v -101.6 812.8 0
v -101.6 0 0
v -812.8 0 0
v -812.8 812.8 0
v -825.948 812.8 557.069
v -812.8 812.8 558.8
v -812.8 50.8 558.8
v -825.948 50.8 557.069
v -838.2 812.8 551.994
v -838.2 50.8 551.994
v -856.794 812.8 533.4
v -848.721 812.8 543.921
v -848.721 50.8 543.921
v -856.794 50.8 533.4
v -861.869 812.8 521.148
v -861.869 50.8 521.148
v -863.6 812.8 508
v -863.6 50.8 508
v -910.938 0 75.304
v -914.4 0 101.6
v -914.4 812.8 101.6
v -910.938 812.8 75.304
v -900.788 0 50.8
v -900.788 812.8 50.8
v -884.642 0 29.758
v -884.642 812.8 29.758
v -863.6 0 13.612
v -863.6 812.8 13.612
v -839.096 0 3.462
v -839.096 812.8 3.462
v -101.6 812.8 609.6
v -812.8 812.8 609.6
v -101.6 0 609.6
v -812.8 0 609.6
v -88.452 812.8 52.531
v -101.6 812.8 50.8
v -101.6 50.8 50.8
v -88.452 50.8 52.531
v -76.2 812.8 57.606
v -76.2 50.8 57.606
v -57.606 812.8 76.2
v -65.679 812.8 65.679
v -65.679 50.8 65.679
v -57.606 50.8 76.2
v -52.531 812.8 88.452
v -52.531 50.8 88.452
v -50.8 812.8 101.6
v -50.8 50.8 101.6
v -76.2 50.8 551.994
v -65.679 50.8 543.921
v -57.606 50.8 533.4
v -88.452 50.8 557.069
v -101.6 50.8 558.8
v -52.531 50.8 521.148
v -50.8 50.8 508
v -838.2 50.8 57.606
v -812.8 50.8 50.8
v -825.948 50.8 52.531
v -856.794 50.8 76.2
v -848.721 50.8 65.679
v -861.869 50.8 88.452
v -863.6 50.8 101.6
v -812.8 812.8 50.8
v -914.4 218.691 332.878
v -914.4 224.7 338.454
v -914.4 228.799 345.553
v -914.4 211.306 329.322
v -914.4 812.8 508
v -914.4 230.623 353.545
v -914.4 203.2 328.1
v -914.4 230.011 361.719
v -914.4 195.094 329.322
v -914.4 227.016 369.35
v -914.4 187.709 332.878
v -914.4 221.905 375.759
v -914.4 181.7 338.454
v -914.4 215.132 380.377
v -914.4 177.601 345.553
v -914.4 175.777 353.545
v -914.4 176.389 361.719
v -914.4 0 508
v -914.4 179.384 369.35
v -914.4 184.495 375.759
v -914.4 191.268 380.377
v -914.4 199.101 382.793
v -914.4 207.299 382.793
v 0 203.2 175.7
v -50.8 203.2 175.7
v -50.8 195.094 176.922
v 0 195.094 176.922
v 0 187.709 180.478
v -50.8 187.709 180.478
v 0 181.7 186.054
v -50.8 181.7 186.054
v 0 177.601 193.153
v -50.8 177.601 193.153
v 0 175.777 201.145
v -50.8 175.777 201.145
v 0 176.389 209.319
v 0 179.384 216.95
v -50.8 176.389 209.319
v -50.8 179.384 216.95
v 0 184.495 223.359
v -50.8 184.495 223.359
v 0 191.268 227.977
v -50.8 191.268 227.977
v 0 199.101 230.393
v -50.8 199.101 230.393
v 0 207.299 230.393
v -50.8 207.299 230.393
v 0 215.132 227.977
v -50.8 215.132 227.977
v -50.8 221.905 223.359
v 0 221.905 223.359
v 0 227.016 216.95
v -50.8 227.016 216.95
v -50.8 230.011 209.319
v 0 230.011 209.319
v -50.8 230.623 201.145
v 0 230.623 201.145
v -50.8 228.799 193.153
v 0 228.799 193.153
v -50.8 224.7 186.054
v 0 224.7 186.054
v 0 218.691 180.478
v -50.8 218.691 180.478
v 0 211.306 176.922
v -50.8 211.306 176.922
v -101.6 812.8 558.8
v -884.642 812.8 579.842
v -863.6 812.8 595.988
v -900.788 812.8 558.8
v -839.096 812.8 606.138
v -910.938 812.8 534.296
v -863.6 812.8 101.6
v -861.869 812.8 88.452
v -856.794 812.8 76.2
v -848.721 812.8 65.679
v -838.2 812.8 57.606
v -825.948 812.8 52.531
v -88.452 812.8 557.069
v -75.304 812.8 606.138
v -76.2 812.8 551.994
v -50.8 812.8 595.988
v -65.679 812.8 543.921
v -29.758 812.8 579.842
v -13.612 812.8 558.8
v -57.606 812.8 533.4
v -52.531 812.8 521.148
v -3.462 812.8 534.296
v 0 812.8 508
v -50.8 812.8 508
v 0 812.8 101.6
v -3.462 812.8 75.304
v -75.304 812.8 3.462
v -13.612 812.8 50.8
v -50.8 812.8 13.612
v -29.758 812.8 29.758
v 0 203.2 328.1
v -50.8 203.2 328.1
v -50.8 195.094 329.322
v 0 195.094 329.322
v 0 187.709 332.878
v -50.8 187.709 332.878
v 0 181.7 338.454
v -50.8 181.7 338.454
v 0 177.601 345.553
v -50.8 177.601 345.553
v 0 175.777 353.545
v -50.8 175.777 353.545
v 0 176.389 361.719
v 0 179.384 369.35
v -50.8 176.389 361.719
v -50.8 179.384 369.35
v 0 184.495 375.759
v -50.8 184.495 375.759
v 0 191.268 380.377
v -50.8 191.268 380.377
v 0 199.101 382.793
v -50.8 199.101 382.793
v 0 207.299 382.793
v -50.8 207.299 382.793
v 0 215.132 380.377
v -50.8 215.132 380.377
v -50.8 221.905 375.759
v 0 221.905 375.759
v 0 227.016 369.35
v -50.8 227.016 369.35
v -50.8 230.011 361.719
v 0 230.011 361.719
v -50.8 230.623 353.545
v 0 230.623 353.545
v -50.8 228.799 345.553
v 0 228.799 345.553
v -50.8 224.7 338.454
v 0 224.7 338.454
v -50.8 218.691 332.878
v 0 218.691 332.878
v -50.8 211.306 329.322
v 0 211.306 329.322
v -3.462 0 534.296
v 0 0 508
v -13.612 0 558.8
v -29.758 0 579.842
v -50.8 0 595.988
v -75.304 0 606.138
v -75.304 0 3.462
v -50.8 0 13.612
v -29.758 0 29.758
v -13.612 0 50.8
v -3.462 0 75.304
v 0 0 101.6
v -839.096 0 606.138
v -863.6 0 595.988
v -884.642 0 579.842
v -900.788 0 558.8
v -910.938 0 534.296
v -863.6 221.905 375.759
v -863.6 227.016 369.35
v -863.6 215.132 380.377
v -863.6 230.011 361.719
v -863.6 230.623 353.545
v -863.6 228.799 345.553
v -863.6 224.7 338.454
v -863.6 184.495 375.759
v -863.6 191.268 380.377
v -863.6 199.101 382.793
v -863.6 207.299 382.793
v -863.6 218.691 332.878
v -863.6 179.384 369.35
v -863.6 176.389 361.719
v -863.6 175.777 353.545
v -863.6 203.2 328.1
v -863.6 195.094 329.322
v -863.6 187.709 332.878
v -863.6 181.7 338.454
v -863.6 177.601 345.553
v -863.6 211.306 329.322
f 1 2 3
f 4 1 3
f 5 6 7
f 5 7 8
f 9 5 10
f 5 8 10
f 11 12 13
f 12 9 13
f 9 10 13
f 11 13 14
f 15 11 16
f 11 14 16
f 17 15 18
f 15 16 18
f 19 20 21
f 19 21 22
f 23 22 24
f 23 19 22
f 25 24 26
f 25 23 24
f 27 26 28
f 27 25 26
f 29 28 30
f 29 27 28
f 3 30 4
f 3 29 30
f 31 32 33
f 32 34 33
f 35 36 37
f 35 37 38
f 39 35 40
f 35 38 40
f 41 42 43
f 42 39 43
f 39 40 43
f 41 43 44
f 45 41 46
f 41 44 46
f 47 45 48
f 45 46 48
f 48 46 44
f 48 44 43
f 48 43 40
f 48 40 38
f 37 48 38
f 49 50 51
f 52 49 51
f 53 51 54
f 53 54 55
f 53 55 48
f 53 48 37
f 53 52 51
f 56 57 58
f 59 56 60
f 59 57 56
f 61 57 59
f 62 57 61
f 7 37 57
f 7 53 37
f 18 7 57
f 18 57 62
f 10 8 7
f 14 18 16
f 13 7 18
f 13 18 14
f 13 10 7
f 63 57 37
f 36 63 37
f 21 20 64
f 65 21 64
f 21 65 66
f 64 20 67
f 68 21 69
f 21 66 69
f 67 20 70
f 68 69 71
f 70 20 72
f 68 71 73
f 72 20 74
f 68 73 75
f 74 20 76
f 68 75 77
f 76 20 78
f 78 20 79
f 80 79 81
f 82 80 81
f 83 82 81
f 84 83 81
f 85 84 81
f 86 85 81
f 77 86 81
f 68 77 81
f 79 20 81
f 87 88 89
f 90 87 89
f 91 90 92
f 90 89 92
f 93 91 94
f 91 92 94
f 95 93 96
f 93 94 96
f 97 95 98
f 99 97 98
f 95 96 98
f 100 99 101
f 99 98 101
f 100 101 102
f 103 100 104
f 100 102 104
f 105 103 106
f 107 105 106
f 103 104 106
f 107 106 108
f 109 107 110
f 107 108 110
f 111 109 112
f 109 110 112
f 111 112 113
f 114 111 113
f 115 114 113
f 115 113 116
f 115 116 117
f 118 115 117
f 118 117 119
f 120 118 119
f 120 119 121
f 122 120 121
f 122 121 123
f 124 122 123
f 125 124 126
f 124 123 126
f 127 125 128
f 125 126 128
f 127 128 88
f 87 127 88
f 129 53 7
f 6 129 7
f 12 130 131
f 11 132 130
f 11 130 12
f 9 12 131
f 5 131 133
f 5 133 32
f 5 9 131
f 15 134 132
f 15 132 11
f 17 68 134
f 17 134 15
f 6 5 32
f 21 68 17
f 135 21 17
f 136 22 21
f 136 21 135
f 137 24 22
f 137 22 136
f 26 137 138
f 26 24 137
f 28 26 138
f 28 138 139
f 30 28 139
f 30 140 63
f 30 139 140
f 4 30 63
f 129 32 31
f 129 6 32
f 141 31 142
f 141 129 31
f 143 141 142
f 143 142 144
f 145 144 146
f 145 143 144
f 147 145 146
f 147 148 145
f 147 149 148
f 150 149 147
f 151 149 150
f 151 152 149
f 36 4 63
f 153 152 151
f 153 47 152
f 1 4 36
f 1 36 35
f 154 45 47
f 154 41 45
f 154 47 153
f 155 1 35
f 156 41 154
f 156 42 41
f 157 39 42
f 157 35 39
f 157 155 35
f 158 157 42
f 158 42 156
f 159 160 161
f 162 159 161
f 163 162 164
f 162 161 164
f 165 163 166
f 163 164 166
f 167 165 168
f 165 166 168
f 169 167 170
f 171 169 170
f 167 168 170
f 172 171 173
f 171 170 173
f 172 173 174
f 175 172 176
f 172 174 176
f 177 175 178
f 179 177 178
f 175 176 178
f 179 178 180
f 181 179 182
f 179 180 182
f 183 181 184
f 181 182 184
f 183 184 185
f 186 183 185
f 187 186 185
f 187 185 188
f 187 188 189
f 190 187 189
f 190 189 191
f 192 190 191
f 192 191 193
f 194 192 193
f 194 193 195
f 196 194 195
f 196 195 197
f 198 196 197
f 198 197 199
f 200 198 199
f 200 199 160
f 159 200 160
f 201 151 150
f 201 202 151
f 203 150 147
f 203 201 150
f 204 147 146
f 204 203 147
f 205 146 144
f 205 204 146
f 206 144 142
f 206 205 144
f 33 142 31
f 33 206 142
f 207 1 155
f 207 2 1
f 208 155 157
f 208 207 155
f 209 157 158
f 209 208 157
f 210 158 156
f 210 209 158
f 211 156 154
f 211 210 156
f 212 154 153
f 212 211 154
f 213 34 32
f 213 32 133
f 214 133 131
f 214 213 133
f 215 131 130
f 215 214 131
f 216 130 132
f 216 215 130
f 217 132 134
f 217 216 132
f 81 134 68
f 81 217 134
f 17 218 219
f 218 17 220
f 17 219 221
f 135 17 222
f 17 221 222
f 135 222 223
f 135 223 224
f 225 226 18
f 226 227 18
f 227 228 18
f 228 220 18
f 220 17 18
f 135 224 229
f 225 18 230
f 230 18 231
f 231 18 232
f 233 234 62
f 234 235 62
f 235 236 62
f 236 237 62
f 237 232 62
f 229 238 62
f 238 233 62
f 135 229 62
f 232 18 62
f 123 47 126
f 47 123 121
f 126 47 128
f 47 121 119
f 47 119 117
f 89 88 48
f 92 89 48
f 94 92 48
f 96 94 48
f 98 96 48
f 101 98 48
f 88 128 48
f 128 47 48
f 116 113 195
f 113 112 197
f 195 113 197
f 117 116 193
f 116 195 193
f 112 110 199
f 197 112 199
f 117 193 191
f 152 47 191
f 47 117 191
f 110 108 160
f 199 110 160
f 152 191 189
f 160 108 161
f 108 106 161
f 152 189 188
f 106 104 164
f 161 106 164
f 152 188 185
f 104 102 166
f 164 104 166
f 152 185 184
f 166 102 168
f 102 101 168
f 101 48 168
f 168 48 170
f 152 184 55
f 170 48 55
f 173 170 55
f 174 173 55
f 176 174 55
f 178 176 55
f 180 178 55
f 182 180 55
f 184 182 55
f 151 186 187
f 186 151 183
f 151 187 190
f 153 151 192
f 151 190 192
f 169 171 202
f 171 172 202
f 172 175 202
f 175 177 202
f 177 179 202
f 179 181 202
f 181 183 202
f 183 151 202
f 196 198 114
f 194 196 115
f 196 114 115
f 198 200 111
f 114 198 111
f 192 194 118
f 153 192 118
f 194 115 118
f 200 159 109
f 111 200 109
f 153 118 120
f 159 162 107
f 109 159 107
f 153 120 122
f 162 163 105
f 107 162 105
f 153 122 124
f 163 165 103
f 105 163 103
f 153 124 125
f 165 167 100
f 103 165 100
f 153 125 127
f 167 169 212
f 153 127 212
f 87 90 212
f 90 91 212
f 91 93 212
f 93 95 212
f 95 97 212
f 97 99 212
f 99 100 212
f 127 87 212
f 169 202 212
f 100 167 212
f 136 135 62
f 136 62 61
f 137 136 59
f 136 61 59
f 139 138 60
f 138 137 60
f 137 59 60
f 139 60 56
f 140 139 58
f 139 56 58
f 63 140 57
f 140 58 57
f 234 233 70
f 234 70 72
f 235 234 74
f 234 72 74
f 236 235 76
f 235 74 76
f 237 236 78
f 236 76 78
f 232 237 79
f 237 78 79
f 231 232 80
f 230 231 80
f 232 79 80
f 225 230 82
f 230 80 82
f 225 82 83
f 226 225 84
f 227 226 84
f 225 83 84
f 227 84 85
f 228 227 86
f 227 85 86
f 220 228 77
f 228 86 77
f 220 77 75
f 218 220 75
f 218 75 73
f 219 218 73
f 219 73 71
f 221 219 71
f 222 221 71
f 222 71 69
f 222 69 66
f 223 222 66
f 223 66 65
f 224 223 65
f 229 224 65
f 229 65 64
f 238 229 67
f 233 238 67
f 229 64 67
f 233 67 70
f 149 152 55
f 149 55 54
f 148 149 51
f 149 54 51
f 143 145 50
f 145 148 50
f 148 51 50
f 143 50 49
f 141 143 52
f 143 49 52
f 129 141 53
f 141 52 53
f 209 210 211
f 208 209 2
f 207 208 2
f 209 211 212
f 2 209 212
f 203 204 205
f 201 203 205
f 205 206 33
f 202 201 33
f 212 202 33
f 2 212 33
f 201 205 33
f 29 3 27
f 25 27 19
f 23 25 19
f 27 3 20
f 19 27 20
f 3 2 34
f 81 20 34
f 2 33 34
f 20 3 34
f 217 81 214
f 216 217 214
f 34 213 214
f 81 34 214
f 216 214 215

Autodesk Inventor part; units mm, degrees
ref_plane "YZ Plane" through (0, 0, 0) normal (1, 0, 0) x (0, 1, 0)
ref_plane "XZ Plane" through (0, 0, 0) normal (0, 1, 0) x (-1, 0, 0)
ref_plane "XY Plane" through (0, 0, 0) normal (0, 0, 1) x (1, 0, 0)
sketch "Sketch1" plane through (0, 0, 0) normal (0, 1, 0) x (-1, 0, 0)
  line L0 (101.6, 0) -> (812.8, 0)
  line L1 (914.4, 101.6) -> (914.4, 508)
  line L2 (812.8, 609.6) -> (101.6, 609.6)
  line L3 (0, 508) -> (0, 101.6)
  arc A0 (101.6, 609.6) -> (0, 508) centre (101.6, 508) ccw
  arc A1 (0, 101.6) -> (101.6, 0) centre (101.6, 101.6) ccw
  arc A2 (812.8, 0) -> (914.4, 101.6) centre (812.8, 101.6) ccw
  arc A3 (914.4, 508) -> (812.8, 609.6) centre (812.8, 508) ccw
  point P0 (0, 0)
  point P1 (914.4, 609.6)
  point P2 (914.4, 0)
  point P3 (0, 609.6)
  dimension "d0" = 914.4
  dimension "d1" = 609.6
  dimension "d9" = 101.6
extrude "Extrusion1" add sketch "Sketch1" along normal blind 50.8
sketch "Sketch3" plane through (0, 50.8, 0) normal (0, 1, 0) x (1, 0, 0)
  line L0 (0, -508) -> (0, -101.6) projected
  arc A0 (0, -101.6) -> (-101.6, 0) centre (-101.6, -101.6) ccw projected
  line L1 (-101.6, 0) -> (-812.8, 0) projected
  arc A1 (-812.8, 0) -> (-914.4, -101.6) centre (-812.8, -101.6) ccw projected
  line L2 (-914.4, -101.6) -> (-914.4, -508) projected
  arc A2 (-914.4, -508) -> (-812.8, -609.6) centre (-812.8, -508) ccw projected
  line L3 (-812.8, -609.6) -> (-101.6, -609.6) projected
  arc A3 (-101.6, -609.6) -> (0, -508) centre (-101.6, -508) ccw projected
  line L4 (-812.8, -50.8) -> (-101.6, -50.8)
  arc A4 (-50.8, -101.6) -> (-101.6, -50.8) centre (-101.6, -101.6) ccw
  line L5 (-50.8, -101.6) -> (-50.8, -508)
  arc A5 (-101.6, -558.8) -> (-50.8, -508) centre (-101.6, -508) ccw
  line L6 (-101.6, -558.8) -> (-812.8, -558.8)
  arc A6 (-863.6, -508) -> (-812.8, -558.8) centre (-812.8, -508) ccw
  line L7 (-863.6, -508) -> (-863.6, -101.6)
  arc A7 (-812.8, -50.8) -> (-863.6, -101.6) centre (-812.8, -101.6) ccw
  point P0 (0, 0)
  dimension "d10" = 50.8
extrude "Extrusion3" add sketch "Sketch3" along normal blind 762
sketch "Sketch6" plane through (0, 0, 508) normal (1, 0, 0) x (0, 0, -1)
  line L0 (0, 812.8) -> (406.4, 812.8) projected
  line L1 (0, 0) -> (0, 812.8) projected
  circle A0 centre (152.4, 203.2) radius 21.7288
  point P0 (508, 0)
  dimension "d35" = 609.6
  dimension "d36" = 152.4
hole "Hole3" at (0, 203.2, 355.6) direction (-1, 0, 0) diameter 55 end through all
sketch "Sketch7" plane through (0, 0, 508) normal (1, 0, 0) x (0, 0, -1)
  circle A0 centre (152.4, 203.2) radius 27.5 projected
  circle A1 centre (304.8, 203.2) radius 31.75
  point P0 (508, 0)
  dimension "d44" = 63.5
  dimension "d45" = 152.4
hole "Hole4" at (0, 203.2, 203.2) direction (-1, 0, 0) diameter 55 depth 152.4 tip angle 118
properties part number "pullbox"
